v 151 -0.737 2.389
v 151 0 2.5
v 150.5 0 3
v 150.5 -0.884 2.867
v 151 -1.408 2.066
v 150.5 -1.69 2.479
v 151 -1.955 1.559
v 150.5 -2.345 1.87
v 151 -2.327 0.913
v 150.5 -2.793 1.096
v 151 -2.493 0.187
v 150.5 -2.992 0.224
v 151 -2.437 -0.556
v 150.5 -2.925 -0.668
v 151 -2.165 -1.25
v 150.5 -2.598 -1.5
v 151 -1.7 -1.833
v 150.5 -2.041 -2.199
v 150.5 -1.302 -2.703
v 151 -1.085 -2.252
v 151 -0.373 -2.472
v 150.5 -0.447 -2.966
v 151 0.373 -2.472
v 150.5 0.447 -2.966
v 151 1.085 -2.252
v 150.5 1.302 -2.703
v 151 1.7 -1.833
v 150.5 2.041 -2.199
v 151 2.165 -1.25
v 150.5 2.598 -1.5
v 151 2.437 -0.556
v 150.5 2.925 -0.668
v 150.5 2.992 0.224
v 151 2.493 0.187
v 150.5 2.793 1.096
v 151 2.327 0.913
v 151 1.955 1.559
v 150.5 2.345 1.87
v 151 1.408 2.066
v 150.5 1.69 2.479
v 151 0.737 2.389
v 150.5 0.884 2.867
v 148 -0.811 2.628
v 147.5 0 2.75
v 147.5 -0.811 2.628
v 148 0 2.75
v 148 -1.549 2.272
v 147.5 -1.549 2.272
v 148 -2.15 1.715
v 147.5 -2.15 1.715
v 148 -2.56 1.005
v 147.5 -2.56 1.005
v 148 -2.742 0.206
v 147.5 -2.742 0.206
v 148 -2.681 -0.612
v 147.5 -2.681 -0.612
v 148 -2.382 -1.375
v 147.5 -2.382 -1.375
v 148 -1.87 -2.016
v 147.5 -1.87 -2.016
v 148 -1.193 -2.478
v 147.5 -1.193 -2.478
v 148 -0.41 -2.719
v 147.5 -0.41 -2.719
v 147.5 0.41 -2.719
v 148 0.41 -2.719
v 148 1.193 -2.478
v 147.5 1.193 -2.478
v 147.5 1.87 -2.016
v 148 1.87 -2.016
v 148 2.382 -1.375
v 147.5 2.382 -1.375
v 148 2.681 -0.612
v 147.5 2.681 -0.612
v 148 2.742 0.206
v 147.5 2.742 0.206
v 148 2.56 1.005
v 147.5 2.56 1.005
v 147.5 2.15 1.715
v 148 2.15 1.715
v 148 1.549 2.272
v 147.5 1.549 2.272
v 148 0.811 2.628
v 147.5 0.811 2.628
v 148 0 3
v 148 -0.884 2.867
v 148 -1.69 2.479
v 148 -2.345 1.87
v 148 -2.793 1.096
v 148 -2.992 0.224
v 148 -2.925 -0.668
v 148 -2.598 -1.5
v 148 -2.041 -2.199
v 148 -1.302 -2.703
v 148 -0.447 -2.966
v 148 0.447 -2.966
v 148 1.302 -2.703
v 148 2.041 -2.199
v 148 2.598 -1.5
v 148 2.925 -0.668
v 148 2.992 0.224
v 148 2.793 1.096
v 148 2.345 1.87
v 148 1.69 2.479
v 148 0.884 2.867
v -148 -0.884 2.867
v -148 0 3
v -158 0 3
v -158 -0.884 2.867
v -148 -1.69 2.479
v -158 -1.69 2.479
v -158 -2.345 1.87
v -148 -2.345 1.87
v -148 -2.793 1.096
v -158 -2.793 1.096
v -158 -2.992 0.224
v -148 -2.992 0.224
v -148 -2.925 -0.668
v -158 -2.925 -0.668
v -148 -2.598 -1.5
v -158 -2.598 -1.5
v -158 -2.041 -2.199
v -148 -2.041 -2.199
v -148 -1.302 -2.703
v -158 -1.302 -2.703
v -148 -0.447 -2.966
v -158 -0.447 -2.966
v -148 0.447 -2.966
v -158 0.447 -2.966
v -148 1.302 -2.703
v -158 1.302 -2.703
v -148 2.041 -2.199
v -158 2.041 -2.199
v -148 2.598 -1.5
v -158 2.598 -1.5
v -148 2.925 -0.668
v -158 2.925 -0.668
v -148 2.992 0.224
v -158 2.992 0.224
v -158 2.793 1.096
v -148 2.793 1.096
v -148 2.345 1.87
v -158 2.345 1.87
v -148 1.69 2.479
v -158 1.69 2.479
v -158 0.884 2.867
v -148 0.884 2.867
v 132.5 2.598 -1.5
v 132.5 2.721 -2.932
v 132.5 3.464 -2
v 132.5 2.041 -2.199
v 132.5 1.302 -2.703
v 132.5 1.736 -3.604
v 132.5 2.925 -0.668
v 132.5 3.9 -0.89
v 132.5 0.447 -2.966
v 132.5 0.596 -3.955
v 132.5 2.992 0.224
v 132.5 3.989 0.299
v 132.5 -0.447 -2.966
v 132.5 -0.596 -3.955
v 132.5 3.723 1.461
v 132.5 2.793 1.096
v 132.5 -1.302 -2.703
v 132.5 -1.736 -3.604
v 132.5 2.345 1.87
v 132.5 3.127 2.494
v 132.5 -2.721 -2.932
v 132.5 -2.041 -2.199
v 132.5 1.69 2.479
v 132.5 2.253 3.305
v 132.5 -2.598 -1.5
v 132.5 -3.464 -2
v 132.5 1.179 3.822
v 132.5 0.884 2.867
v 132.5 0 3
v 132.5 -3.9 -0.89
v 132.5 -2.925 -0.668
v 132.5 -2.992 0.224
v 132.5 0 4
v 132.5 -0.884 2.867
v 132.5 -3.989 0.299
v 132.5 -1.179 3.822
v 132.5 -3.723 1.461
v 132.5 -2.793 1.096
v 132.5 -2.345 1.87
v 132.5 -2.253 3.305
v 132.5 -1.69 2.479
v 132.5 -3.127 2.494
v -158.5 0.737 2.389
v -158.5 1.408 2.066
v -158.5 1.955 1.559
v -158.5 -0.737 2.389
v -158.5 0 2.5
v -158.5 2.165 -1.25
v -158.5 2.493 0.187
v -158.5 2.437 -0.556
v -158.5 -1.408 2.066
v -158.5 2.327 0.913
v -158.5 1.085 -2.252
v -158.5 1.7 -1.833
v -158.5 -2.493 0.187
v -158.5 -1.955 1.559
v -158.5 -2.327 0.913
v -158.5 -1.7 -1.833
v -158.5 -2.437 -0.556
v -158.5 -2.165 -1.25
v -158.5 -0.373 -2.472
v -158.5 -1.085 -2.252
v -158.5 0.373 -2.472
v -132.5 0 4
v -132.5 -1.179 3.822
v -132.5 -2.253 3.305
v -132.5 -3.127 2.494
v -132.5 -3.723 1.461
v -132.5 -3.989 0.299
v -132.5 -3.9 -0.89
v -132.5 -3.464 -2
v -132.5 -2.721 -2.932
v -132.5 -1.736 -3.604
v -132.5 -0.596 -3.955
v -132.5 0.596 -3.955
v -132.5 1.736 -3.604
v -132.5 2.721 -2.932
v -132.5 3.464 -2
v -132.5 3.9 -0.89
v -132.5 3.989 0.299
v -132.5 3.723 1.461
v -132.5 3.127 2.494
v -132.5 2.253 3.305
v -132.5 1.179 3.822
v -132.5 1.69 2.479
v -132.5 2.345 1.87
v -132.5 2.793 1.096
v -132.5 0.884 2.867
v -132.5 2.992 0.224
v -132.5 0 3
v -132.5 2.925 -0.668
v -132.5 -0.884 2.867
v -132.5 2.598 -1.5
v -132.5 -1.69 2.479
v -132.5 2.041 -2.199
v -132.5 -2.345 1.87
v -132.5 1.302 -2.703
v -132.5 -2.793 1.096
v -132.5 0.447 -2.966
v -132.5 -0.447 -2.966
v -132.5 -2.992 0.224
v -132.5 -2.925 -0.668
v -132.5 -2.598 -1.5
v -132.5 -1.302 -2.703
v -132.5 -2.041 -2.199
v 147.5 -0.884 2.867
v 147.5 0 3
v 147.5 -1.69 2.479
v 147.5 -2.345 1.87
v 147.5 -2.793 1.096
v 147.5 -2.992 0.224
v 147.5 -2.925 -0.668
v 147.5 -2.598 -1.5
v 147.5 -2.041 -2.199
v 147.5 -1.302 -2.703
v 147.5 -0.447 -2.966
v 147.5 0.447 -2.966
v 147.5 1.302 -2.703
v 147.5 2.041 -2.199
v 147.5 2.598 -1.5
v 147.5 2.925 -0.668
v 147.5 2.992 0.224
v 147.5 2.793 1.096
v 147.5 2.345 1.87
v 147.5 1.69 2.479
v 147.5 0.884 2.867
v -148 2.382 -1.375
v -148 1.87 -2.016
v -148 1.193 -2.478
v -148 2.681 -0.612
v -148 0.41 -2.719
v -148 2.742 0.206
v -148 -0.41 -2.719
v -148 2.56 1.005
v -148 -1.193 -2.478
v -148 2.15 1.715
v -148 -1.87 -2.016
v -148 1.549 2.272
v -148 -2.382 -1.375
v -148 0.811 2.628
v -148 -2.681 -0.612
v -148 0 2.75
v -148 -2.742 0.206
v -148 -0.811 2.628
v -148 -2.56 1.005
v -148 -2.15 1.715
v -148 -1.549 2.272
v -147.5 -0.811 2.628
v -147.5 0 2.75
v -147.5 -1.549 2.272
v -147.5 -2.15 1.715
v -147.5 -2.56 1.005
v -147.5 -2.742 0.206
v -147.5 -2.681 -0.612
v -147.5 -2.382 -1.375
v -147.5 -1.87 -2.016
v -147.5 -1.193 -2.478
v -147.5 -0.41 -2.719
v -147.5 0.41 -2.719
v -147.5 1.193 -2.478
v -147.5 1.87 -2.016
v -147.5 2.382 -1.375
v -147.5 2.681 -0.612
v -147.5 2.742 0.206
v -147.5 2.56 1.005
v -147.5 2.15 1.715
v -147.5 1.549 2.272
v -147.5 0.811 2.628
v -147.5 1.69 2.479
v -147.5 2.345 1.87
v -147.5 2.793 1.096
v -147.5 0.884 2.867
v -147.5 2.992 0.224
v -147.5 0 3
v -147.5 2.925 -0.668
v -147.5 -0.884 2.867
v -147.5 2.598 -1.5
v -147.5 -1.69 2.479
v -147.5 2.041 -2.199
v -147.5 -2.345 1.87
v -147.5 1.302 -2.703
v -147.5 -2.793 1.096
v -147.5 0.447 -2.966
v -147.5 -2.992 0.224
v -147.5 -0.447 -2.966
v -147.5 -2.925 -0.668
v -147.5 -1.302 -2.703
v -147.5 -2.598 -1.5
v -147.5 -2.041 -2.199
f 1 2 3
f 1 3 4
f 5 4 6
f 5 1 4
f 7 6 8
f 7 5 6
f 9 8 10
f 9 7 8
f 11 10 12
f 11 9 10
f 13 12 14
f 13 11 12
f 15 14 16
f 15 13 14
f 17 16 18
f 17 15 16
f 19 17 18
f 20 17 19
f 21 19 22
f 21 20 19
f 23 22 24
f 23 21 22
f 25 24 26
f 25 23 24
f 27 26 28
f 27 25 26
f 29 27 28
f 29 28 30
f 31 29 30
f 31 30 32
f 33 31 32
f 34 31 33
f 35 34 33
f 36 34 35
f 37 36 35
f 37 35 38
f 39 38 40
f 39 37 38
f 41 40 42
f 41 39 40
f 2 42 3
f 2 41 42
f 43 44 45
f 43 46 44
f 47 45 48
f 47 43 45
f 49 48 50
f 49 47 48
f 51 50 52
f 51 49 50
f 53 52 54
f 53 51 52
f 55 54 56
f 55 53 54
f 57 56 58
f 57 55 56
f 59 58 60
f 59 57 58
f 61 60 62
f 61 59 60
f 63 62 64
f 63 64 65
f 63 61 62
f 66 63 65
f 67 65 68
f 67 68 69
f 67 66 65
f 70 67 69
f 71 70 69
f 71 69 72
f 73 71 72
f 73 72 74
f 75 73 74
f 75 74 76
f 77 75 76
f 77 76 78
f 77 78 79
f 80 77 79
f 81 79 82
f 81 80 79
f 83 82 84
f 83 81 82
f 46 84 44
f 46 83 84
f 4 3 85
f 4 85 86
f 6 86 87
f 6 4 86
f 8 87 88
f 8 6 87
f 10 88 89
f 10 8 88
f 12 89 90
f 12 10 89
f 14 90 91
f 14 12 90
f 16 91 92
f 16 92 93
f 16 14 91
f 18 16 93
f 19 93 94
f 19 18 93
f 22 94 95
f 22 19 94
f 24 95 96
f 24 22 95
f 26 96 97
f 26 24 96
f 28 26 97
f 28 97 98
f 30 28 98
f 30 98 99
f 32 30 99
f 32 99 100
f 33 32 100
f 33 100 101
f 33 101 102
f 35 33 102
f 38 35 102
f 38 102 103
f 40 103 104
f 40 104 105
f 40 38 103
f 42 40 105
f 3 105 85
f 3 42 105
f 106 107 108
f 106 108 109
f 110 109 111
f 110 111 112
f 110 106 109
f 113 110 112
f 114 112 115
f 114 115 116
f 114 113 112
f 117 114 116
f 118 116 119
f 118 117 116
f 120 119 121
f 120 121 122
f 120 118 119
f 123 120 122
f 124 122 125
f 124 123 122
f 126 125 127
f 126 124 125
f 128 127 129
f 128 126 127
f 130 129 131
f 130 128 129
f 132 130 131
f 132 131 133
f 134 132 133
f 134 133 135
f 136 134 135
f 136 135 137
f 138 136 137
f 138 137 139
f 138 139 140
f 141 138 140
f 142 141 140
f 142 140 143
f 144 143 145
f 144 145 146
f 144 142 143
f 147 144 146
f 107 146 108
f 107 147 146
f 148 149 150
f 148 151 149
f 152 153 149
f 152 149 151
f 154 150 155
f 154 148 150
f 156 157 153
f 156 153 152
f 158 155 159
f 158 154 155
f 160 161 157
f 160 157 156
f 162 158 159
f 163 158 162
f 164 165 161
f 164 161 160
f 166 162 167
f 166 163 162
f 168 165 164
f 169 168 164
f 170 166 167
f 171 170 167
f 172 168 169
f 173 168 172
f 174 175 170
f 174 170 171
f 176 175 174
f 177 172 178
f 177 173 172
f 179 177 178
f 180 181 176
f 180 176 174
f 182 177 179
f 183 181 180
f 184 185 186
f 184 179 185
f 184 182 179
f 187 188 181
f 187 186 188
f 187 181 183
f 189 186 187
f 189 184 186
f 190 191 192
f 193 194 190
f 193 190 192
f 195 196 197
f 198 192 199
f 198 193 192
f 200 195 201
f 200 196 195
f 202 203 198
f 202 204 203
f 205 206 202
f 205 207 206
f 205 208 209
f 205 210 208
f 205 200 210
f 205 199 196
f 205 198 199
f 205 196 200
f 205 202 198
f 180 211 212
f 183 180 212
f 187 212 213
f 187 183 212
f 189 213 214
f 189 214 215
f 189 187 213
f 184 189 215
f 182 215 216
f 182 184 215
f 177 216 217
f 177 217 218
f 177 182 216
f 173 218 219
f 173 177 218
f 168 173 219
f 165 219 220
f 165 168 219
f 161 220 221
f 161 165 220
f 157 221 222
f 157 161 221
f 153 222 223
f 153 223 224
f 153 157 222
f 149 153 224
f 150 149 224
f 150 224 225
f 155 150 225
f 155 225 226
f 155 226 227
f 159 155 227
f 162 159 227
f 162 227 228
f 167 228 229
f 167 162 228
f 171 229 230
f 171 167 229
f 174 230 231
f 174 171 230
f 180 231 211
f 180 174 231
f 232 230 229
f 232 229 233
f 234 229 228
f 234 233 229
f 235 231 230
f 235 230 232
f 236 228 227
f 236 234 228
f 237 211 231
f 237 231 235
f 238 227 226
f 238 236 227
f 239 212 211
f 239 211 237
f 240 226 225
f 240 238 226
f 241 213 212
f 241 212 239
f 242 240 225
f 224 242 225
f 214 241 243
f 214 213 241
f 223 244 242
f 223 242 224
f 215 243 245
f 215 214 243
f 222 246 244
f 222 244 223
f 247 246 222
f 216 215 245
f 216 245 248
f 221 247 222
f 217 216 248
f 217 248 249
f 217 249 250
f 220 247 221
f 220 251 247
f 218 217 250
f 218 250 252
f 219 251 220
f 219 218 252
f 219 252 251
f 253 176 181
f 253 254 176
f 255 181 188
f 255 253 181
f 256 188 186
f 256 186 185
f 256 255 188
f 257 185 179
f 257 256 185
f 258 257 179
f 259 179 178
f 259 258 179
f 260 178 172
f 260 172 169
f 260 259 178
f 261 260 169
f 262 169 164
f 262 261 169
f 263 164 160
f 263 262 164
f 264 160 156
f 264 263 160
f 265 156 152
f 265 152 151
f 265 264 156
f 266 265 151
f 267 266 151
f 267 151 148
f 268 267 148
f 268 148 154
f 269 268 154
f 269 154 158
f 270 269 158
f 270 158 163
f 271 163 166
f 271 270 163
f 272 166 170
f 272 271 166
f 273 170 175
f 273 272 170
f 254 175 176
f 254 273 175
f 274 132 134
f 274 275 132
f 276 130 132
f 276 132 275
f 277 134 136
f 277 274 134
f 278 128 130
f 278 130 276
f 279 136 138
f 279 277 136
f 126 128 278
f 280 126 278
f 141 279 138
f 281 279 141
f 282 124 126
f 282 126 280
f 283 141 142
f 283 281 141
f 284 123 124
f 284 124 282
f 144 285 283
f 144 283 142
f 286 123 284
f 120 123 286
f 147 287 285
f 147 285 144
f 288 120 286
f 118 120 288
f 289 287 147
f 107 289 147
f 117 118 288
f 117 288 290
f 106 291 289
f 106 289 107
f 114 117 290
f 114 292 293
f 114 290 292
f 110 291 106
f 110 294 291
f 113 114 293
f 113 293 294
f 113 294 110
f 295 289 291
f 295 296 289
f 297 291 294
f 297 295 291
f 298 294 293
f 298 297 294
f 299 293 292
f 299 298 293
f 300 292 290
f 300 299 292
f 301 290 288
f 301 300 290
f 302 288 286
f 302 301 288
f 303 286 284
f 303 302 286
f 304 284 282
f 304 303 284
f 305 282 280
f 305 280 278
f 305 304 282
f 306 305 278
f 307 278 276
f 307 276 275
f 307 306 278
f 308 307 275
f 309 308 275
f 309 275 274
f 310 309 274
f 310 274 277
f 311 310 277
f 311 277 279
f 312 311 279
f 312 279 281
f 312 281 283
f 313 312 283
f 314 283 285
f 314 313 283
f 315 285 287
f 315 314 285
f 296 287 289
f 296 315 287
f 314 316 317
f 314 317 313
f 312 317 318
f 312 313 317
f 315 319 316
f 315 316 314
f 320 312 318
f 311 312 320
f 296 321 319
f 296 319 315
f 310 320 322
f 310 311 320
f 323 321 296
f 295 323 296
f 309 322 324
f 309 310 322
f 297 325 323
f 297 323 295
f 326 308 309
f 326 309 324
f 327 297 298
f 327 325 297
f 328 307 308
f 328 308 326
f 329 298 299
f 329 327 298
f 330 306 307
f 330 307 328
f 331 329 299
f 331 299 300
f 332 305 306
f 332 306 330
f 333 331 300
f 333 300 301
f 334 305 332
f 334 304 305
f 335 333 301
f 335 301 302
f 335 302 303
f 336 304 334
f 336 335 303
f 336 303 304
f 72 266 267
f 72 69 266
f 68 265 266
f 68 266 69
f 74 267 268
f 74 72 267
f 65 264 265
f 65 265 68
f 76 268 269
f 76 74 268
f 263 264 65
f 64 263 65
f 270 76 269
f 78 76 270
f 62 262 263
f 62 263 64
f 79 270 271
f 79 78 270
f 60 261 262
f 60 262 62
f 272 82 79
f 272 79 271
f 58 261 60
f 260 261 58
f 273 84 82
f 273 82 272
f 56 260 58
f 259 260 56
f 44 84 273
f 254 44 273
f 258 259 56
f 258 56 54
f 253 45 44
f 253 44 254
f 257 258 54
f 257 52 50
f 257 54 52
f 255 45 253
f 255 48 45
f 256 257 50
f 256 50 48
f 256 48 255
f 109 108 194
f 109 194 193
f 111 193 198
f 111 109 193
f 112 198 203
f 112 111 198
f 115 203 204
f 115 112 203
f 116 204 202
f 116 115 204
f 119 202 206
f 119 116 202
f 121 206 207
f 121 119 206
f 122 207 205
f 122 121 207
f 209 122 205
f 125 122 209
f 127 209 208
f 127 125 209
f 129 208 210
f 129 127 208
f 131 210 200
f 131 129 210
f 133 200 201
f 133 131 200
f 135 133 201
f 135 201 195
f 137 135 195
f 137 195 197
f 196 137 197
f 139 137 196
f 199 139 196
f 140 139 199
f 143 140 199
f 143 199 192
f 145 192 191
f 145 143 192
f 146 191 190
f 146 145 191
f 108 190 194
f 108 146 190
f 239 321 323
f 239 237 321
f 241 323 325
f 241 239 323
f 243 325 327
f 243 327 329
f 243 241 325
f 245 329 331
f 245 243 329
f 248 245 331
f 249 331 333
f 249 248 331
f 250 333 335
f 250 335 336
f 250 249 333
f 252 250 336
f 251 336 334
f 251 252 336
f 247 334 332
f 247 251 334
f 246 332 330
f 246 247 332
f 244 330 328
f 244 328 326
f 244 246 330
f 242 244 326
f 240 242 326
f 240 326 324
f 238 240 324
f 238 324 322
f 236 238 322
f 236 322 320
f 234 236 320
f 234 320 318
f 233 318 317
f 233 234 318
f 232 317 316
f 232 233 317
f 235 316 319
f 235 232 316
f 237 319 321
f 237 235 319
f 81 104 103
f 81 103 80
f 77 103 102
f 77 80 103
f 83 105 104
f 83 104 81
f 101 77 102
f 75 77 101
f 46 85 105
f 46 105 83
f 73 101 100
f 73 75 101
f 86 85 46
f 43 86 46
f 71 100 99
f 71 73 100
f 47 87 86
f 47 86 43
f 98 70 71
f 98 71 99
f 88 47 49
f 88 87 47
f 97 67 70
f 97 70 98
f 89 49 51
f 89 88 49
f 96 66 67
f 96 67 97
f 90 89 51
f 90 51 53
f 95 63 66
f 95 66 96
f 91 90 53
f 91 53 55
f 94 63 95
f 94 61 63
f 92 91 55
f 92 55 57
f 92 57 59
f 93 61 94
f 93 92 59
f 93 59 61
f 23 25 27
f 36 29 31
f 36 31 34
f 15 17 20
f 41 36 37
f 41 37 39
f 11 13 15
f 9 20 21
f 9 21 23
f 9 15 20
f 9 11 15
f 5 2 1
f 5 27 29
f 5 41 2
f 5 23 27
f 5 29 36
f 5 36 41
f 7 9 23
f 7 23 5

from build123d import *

# Parameters (mm, degrees)
CHAMFER_1_SIZE = 0.5


with BuildPart() as part:
    # 草图1 → 旋转1 (revolve)
    with BuildSketch(Plane.XY, mode=Mode.PRIVATE) as revolve_1_sk:
        Polygon((-132.5, 4), (132.5, 4), (132.5, 3), (147.5, 3), (147.5, 2.75), (148, 2.75), (148, 3), (151, 3), (151, 0), (-158.5, 0), (-158.5, 3), (-148, 3), (-148, 2.75), (-147.5, 2.75), (-147.5, 3), (-132.5, 3), align=None)
    revolve(revolve_1_sk.sketch.rotate(Axis((0, 0, 0), (1, 0, 0)), 90), axis=Axis((0, 0, 0), (1, 0, 0)))

    # 倒角1
    chamfer_1_edges = [part.edges().sort_by_distance(p)[0] for p in [
        (151, 0, -3),
        (-158.5, 0, -3),
    ]]
    chamfer(chamfer_1_edges, length=CHAMFER_1_SIZE)


solid = part.part
